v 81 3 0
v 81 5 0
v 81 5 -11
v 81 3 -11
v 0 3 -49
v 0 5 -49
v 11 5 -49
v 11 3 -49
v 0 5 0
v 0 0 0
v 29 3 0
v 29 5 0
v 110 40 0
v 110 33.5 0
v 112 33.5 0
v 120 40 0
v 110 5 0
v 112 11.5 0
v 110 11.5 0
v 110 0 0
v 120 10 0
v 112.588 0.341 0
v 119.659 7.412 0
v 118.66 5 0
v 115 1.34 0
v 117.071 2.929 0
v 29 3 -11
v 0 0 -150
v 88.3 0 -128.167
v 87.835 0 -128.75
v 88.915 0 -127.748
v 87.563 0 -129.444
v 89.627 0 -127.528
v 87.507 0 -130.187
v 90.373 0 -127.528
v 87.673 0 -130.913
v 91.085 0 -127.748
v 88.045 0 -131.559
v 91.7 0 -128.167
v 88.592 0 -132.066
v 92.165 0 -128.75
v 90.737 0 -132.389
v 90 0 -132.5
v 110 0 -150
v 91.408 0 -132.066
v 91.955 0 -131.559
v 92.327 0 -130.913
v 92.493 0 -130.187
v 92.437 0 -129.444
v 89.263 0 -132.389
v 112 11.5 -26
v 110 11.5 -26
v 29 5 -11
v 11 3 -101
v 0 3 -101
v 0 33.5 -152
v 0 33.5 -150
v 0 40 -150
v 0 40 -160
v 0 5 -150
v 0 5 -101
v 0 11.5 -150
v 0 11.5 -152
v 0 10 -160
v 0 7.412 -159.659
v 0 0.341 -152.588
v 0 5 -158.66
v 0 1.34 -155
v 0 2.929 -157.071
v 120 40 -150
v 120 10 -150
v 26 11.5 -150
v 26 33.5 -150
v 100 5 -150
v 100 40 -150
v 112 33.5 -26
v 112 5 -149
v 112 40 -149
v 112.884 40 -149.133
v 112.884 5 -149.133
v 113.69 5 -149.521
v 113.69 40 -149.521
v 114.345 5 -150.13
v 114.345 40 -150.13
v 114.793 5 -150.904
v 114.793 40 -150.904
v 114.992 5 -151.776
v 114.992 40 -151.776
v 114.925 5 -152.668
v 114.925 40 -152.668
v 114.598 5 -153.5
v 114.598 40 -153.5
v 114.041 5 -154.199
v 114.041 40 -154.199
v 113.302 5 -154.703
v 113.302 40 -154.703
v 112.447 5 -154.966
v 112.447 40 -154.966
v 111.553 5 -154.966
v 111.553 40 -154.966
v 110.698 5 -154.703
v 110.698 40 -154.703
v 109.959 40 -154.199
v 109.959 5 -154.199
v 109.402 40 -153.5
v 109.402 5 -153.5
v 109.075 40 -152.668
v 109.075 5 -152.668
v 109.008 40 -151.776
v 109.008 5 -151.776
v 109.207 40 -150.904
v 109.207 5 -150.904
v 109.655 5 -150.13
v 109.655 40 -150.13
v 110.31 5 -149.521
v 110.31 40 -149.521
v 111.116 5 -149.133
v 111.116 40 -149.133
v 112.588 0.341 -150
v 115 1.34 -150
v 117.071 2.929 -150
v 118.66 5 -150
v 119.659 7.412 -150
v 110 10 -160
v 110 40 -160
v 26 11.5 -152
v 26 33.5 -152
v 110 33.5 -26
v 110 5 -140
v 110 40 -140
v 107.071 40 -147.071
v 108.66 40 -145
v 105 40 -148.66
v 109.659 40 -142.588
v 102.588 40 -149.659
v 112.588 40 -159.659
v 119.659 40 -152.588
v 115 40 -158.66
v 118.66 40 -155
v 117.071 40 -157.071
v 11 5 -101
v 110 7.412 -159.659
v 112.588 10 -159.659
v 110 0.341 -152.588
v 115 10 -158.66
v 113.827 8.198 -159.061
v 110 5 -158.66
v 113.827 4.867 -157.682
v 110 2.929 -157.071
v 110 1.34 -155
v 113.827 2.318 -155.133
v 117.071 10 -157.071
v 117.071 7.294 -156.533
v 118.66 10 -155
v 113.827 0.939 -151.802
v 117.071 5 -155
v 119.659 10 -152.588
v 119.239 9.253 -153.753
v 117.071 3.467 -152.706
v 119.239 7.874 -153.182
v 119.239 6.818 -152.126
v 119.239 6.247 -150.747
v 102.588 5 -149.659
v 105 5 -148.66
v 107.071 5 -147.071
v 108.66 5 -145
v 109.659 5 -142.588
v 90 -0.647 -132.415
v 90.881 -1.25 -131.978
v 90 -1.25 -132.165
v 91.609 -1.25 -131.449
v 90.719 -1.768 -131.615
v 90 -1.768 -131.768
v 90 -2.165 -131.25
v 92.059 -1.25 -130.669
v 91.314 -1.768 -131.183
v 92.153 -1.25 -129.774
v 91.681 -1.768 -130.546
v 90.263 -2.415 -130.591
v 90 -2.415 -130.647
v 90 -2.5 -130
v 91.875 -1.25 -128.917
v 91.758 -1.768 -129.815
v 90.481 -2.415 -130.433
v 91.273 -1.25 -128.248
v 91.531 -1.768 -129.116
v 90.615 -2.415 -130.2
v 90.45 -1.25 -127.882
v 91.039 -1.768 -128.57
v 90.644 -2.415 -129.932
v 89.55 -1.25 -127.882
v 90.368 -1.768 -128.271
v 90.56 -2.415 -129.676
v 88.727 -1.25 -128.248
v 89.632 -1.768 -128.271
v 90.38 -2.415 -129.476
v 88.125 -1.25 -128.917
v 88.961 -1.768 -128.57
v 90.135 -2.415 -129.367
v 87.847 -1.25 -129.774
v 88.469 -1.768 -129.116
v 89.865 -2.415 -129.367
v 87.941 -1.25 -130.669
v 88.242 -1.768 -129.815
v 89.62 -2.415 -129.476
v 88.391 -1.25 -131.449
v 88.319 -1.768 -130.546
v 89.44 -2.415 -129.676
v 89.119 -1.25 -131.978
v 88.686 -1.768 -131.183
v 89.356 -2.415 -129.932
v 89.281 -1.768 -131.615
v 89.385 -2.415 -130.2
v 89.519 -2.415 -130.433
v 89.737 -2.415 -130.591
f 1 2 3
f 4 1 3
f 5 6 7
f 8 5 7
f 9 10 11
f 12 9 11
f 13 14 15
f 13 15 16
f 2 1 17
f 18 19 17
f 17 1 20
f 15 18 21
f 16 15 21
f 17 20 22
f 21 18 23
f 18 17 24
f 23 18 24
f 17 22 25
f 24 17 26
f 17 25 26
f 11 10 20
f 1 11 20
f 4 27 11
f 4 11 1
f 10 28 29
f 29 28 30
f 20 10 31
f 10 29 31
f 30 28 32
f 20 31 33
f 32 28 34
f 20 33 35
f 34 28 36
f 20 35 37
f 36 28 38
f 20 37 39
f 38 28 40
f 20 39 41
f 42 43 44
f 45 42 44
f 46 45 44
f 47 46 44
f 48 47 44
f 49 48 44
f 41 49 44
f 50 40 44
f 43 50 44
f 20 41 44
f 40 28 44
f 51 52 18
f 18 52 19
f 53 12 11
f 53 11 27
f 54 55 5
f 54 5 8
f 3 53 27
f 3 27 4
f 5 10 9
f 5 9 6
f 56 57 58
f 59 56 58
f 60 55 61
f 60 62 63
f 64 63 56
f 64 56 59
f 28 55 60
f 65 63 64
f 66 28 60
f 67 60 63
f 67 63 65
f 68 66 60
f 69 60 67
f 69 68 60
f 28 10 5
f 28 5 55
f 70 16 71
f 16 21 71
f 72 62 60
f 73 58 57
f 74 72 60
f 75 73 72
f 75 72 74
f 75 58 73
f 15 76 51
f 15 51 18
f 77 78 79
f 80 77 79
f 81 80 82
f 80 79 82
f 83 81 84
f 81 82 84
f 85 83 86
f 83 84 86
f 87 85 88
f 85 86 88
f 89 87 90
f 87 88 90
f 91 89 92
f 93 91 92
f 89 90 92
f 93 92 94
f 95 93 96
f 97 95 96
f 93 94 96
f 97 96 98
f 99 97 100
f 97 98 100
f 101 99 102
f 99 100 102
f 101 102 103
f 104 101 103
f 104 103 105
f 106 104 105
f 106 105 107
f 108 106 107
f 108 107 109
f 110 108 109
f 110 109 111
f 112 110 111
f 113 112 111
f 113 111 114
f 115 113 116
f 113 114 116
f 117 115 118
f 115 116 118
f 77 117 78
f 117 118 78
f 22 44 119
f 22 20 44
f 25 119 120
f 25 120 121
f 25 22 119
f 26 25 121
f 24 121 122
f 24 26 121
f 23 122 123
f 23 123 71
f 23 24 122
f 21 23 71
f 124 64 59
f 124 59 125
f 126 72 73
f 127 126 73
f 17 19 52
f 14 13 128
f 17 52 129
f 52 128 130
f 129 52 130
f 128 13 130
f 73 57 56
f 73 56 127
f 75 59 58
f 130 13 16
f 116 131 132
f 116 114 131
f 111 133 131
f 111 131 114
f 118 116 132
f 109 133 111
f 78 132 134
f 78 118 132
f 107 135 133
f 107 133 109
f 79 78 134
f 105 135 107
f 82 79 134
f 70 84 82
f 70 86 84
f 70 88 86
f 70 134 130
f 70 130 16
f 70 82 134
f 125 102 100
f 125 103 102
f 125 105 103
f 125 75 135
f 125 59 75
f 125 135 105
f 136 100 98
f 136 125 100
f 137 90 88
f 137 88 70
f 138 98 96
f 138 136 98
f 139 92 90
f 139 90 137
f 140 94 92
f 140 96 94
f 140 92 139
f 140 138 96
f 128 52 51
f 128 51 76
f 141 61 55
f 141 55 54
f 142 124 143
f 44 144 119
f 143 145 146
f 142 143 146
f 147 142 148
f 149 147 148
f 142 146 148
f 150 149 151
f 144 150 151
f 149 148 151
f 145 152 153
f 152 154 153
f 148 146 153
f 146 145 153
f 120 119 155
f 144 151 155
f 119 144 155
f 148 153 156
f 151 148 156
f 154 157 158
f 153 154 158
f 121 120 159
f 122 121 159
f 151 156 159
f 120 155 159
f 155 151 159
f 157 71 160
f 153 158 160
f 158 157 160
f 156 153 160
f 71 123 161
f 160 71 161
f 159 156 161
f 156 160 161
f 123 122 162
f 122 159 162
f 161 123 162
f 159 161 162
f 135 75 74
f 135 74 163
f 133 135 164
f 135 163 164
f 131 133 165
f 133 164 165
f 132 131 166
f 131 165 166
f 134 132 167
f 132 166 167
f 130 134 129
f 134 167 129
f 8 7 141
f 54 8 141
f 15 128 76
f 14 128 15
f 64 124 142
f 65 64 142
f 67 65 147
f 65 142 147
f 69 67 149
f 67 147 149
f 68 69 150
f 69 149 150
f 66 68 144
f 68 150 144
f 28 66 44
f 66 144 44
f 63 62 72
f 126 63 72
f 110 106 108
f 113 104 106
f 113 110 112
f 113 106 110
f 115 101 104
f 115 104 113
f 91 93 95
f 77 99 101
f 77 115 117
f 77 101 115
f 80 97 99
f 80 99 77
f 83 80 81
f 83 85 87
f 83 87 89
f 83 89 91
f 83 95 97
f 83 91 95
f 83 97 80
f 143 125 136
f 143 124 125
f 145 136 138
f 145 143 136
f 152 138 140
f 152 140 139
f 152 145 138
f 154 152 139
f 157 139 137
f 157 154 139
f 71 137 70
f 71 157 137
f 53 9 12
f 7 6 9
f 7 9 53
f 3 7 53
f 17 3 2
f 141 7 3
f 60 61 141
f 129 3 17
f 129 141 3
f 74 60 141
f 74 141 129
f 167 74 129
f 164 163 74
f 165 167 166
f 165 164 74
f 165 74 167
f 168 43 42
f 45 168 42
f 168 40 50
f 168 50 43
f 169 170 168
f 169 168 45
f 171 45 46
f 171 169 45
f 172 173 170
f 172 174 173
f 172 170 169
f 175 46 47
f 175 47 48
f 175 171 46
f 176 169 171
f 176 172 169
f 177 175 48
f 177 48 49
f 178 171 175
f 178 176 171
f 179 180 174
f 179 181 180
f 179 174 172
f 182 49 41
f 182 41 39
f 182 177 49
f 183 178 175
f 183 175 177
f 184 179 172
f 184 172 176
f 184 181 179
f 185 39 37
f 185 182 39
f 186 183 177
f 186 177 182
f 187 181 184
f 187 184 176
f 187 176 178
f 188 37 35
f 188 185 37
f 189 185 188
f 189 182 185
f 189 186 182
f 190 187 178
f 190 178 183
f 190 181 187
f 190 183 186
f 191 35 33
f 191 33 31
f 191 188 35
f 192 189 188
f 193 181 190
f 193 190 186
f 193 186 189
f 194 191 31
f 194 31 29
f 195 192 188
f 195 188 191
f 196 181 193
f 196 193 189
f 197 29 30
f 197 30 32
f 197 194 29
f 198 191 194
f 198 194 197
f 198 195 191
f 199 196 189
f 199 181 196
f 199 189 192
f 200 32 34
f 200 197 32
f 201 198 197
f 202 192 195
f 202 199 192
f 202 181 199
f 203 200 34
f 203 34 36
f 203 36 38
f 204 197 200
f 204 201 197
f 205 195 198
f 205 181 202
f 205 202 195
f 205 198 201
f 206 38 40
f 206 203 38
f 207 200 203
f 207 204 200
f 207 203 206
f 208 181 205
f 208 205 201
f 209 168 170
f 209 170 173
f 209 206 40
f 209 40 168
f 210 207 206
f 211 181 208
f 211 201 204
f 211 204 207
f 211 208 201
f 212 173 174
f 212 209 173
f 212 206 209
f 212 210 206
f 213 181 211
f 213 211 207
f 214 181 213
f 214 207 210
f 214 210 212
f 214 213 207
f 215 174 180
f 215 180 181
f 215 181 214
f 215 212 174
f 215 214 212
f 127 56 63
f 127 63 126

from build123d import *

# Parameters (mm, degrees)
ESQUISSE1_W             = 120
ESQUISSE1_H             = 160
BOSS_EXTRU_1_DEPTH      = 40
CONG_1_R                = 10
CONG_2_R                = 10
ESQUISSE2_W             = 110
ESQUISSE2_H             = 150
ENL_V_MAT_EXTRU_1_DEPTH = 35
CONG_3_R                = 10
ESQUISSE3_R             = 3
ENL_V_MAT_EXTRU_2_DEPTH = 35
ESQUISSE4_R             = 2.5
BOSS_EXTRU_2_DEPTH      = 2.5
CONG_4_R                = 2.5
ESQUISSE5_W             = 11
ESQUISSE5_H             = 52
ESQUISSE5_W_2           = 52
ESQUISSE5_H_2           = 11
ENL_V_MAT_EXTRU_3_DEPTH = 2
ESQUISSE6_W             = 26
ESQUISSE6_H             = 22
ENL_V_MAT_EXTRU_4_DEPTH = 2
ESQUISSE7_W             = 26
ESQUISSE7_H             = 22
ENL_V_MAT_EXTRU_5_DEPTH = 2


with BuildPart() as part:
    # Esquisse1 → Boss.-Extru.1 (new body)
    with BuildSketch(Plane(origin=(0, 0, 0), x_dir=(1, 0, 0), z_dir=(0, 1, 0))):
        with Locations((60, 80)):
            Rectangle(ESQUISSE1_W, ESQUISSE1_H)
    extrude(amount=BOSS_EXTRU_1_DEPTH)

    # Congé1
    cong_1_edges = [part.edges().sort_by_distance(p)[0] for p in [
        (60, 0, -160),
    ]]
    fillet(cong_1_edges, radius=CONG_1_R)

    # Congé2
    cong_2_edges = [part.edges().sort_by_distance(p)[0] for p in [
        (120, 2.928932188, -157.071067812),
        (120, 0, -75),
        (120, 25, -160),
    ]]
    fillet(cong_2_edges, radius=CONG_2_R)

    # Esquisse2 → Enlèv. mat.-Extru.1 (cut)
    with BuildSketch(Plane(origin=(0, 40, 0), x_dir=(1, 0, 0), z_dir=(0, 1, 0))):
        with Locations((55, 75)):
            Rectangle(ESQUISSE2_W, ESQUISSE2_H)
    extrude(amount=-ENL_V_MAT_EXTRU_1_DEPTH, mode=Mode.SUBTRACT)

    # Congé3
    cong_3_edges = [part.edges().sort_by_distance(p)[0] for p in [
        (110, 22.5, -150),
    ]]
    fillet(cong_3_edges, radius=CONG_3_R)

    # Esquisse3 → Enlèv. mat.-Extru.2 (cut)
    with BuildSketch(Plane(origin=(0, 40, 0), x_dir=(1, 0, 0), z_dir=(0, 1, 0))):
        with Locations(Location((112, 152, 0), (0, 0, 270))):
            Circle(ESQUISSE3_R)
    extrude(amount=-ENL_V_MAT_EXTRU_2_DEPTH, mode=Mode.SUBTRACT)

    # Esquisse4 → Boss.-Extru.2 (add)
    with BuildSketch(Plane.XZ):
        with Locations(Location((90, -130, 0), (0, 0, 270))):
            Circle(ESQUISSE4_R)
    extrude(amount=BOSS_EXTRU_2_DEPTH)

    # Congé4
    cong_4_edges = [part.edges().sort_by_distance(p)[0] for p in [
        (90, -2.5, -127.5),
    ]]
    fillet(cong_4_edges, radius=CONG_4_R - 0.0001)  # a hair under: the kernel refuses the full size

    # Esquisse5 → Enlèv. mat.-Extru.3 (cut)
    with BuildSketch(Plane(origin=(0, 5, 0), x_dir=(1, 0, 0), z_dir=(0, 1, 0))):
        with Locations((5.5, 75)):
            Rectangle(ESQUISSE5_W, ESQUISSE5_H)
        with Locations((55, 5.5)):
            Rectangle(ESQUISSE5_W_2, ESQUISSE5_H_2)
    extrude(amount=-ENL_V_MAT_EXTRU_3_DEPTH, mode=Mode.SUBTRACT)

    # Esquisse6 → Enlèv. mat.-Extru.4 (cut)
    with BuildSketch(Plane.XY.offset(-150)):
        with Locations((13, 22.5)):
            Rectangle(ESQUISSE6_W, ESQUISSE6_H)
    extrude(amount=-ENL_V_MAT_EXTRU_4_DEPTH, mode=Mode.SUBTRACT)

    # Esquisse7 → Enlèv. mat.-Extru.5 (cut)
    with BuildSketch(Plane.ZY.offset(-110)):
        with Locations((-13, 22.5)):
            Rectangle(ESQUISSE7_W, ESQUISSE7_H)
    extrude(amount=-ENL_V_MAT_EXTRU_5_DEPTH, mode=Mode.SUBTRACT)


solid = part.part
